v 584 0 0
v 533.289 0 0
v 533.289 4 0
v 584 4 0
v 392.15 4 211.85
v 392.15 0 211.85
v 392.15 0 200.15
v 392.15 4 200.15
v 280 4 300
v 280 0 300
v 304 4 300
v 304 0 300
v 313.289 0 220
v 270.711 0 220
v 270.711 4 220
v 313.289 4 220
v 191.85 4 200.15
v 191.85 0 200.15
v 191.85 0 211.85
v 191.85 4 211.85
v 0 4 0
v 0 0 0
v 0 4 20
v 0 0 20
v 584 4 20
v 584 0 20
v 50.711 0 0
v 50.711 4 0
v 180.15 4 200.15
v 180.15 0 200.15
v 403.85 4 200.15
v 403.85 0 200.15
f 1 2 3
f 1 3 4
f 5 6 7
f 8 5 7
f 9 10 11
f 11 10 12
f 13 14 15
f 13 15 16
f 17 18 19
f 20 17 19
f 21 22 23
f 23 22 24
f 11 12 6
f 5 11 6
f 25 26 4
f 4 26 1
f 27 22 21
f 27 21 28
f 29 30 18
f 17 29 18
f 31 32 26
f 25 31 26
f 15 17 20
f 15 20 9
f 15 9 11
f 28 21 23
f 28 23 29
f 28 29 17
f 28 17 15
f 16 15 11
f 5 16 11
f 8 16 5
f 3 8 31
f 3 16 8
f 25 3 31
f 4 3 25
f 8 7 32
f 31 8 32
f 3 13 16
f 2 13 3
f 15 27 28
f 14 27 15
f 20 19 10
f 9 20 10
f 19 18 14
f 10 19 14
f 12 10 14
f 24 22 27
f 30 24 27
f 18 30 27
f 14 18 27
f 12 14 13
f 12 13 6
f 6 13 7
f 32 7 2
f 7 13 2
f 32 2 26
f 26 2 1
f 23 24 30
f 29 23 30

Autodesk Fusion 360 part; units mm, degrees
sketch "Schizzo1" plane through (0, 0, 0) normal (0, 1, 0) x (1, 0, 0)
  line L0 (584, 0) -> (0, 0) construction
  line L1 (0, 0) -> (0, -20)
  line L2 (0, -20) -> (280, -300)
  line L3 (280, -300) -> (304, -300)
  line L4 (304, -300) -> (584, -20)
  line L5 (584, -20) -> (584, 0)
  line L6 (50.7107, 0) -> (270.7107, -220)
  line L7 (270.7107, -220) -> (313.2893, -220)
  line L8 (313.2893, -220) -> (533.2893, 0)
  line L9 (0, 0) -> (50.7107, 0)
  line L10 (533.2893, 0) -> (584, 0)
  line L11 (392.15, -211.85) -> (392.15, -200.15)
  line L12 (392.15, -200.15) -> (403.85, -200.15)
  line L13 (180.15, -200.15) -> (191.85, -200.15)
  line L14 (191.85, -200.15) -> (191.85, -211.85)
  line L15 (191.85, -200.15) -> (392.15, -200.15) construction
  dimension "d2" = 45
  dimension "d3" = 45
  dimension "d4" = 20
  dimension "d6" = 20
  dimension "d7" = 584
  dimension "d8" = 50
  dimension "d9" = 50
  dimension "d10" = 80
  dimension "d15" = 300
  dimension "d18" = 200.15
  dimension "d19" = 200.3
  dimension "d20" = 11.7
extrude "Estrusione1" add sketch "Schizzo1" along normal blind 4 contours L1 L2 L3 L4 L5 L6 L7 L8 L9 L10 L11 L12 L13 L14
component "Component" placed x (1, 0, 0) y (0, 1, 0) z (0, 0, 1) at (0, 0, 0)
equation "d11 = h"
equation "h = 4 mm"
equation "t = 0.15 mm"
equation "d18 = 200 mm + t"
equation "d19 = 200 mm + 2 * t"
